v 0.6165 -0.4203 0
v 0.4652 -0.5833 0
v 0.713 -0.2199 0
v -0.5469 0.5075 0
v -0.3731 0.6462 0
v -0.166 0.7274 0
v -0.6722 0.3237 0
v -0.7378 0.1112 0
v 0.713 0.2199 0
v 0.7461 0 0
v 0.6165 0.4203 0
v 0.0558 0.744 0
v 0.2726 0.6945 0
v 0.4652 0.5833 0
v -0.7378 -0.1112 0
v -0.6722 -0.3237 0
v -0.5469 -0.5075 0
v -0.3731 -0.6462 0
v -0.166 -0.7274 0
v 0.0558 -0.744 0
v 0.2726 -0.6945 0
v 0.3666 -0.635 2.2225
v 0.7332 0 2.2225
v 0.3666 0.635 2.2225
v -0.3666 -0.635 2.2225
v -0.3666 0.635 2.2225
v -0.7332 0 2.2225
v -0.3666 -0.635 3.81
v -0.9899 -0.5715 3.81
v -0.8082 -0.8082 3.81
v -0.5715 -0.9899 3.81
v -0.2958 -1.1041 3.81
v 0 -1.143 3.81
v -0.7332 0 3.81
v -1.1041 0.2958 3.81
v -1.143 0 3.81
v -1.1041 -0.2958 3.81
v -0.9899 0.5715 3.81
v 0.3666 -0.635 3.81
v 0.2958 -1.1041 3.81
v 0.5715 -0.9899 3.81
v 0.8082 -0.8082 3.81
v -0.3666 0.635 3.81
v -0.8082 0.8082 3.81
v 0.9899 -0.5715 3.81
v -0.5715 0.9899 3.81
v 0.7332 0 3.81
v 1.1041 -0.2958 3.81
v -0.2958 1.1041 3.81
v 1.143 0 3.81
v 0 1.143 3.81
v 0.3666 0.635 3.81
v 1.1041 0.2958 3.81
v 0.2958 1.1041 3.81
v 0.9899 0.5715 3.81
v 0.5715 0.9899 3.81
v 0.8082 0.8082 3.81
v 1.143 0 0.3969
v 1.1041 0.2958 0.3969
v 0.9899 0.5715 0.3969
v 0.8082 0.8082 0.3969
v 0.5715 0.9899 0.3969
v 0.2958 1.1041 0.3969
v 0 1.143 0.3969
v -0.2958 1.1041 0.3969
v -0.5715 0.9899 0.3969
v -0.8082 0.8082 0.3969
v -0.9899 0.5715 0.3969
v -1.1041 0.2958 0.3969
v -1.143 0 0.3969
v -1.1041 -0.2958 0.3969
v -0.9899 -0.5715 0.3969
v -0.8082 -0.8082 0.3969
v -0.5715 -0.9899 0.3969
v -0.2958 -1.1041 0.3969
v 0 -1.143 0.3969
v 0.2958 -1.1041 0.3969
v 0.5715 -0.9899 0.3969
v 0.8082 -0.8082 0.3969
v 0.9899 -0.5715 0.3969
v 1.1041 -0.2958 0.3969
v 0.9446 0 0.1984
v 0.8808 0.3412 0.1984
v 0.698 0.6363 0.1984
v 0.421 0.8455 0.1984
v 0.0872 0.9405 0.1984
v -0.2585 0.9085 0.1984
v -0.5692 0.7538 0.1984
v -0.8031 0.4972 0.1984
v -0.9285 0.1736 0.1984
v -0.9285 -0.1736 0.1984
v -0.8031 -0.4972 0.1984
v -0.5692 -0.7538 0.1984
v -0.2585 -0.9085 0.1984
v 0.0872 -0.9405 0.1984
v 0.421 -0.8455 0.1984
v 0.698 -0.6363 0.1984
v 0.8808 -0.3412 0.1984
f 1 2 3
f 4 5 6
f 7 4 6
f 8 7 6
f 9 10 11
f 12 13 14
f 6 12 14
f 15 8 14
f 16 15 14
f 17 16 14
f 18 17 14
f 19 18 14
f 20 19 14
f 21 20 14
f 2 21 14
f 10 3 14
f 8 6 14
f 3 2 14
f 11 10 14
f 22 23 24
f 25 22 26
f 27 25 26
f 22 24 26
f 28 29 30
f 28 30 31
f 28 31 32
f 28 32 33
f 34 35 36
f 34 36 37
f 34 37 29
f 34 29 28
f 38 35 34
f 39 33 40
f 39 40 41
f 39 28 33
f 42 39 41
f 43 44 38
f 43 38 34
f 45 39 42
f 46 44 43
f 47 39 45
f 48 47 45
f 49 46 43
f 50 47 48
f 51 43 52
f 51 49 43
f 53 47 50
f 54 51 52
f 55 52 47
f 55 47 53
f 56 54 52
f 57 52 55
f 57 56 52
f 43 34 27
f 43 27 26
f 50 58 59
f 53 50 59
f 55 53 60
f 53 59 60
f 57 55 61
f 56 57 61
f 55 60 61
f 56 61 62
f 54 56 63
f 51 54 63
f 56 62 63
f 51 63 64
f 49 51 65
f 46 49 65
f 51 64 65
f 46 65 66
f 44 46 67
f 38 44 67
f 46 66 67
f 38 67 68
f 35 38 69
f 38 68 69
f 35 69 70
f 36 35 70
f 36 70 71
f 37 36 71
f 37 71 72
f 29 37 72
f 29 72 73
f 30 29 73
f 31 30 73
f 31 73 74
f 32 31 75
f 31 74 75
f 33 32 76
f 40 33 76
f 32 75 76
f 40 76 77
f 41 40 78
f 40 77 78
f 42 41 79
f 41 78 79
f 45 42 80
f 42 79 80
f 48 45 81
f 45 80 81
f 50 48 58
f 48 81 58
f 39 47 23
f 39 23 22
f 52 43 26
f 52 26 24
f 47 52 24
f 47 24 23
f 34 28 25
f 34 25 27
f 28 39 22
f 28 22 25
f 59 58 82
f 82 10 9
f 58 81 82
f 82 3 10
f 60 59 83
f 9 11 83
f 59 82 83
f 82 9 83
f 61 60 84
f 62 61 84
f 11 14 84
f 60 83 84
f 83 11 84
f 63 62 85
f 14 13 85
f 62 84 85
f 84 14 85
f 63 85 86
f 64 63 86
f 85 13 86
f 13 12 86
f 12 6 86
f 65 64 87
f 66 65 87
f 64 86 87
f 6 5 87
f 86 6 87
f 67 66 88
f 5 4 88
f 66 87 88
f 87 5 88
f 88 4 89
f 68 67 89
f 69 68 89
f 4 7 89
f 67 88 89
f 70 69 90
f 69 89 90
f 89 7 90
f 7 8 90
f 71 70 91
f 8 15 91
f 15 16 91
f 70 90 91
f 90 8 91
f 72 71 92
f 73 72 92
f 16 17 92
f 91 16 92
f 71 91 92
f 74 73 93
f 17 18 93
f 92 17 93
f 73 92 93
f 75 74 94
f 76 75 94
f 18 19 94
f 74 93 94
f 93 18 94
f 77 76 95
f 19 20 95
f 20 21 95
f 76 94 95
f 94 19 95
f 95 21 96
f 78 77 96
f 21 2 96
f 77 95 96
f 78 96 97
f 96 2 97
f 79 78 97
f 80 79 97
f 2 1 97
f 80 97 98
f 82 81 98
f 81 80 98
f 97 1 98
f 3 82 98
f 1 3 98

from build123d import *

# Parameters (mm, degrees)
SKETCH1_R      = 1.143
CYLINDER_DEPTH = 3.81
HEX_2_DEPTH    = 1.5875
CHAMFER1_SIZE  = 0.396875


with BuildPart() as part:
    # Sketch1 → cylinder (new body)
    with BuildSketch(Plane.XY):
        Circle(SKETCH1_R)
    extrude(amount=CYLINDER_DEPTH)

    # Hexagon - circumscribed1 → hex 2 (cut)
    with BuildSketch(Plane(origin=(0.056837481, 0.066692776, 3.81), x_dir=(1, 0, 0), z_dir=(0, 0, 1))):
        Polygon((-0.423454902, 0.568307224), (0.30977994, 0.568307224), (0.676397361, -0.066692776), (0.30977994, -0.701692776), (-0.423454902, -0.701692776), (-0.790072323, -0.066692776), align=None)
    extrude(amount=-HEX_2_DEPTH, mode=Mode.SUBTRACT)

    # Chamfer1
    chamfer1_edges = [part.edges().sort_by_distance(p)[0] for p in [
        (-1.143, 0, 0),
    ]]
    chamfer(chamfer1_edges, length=CHAMFER1_SIZE)


solid = part.part
